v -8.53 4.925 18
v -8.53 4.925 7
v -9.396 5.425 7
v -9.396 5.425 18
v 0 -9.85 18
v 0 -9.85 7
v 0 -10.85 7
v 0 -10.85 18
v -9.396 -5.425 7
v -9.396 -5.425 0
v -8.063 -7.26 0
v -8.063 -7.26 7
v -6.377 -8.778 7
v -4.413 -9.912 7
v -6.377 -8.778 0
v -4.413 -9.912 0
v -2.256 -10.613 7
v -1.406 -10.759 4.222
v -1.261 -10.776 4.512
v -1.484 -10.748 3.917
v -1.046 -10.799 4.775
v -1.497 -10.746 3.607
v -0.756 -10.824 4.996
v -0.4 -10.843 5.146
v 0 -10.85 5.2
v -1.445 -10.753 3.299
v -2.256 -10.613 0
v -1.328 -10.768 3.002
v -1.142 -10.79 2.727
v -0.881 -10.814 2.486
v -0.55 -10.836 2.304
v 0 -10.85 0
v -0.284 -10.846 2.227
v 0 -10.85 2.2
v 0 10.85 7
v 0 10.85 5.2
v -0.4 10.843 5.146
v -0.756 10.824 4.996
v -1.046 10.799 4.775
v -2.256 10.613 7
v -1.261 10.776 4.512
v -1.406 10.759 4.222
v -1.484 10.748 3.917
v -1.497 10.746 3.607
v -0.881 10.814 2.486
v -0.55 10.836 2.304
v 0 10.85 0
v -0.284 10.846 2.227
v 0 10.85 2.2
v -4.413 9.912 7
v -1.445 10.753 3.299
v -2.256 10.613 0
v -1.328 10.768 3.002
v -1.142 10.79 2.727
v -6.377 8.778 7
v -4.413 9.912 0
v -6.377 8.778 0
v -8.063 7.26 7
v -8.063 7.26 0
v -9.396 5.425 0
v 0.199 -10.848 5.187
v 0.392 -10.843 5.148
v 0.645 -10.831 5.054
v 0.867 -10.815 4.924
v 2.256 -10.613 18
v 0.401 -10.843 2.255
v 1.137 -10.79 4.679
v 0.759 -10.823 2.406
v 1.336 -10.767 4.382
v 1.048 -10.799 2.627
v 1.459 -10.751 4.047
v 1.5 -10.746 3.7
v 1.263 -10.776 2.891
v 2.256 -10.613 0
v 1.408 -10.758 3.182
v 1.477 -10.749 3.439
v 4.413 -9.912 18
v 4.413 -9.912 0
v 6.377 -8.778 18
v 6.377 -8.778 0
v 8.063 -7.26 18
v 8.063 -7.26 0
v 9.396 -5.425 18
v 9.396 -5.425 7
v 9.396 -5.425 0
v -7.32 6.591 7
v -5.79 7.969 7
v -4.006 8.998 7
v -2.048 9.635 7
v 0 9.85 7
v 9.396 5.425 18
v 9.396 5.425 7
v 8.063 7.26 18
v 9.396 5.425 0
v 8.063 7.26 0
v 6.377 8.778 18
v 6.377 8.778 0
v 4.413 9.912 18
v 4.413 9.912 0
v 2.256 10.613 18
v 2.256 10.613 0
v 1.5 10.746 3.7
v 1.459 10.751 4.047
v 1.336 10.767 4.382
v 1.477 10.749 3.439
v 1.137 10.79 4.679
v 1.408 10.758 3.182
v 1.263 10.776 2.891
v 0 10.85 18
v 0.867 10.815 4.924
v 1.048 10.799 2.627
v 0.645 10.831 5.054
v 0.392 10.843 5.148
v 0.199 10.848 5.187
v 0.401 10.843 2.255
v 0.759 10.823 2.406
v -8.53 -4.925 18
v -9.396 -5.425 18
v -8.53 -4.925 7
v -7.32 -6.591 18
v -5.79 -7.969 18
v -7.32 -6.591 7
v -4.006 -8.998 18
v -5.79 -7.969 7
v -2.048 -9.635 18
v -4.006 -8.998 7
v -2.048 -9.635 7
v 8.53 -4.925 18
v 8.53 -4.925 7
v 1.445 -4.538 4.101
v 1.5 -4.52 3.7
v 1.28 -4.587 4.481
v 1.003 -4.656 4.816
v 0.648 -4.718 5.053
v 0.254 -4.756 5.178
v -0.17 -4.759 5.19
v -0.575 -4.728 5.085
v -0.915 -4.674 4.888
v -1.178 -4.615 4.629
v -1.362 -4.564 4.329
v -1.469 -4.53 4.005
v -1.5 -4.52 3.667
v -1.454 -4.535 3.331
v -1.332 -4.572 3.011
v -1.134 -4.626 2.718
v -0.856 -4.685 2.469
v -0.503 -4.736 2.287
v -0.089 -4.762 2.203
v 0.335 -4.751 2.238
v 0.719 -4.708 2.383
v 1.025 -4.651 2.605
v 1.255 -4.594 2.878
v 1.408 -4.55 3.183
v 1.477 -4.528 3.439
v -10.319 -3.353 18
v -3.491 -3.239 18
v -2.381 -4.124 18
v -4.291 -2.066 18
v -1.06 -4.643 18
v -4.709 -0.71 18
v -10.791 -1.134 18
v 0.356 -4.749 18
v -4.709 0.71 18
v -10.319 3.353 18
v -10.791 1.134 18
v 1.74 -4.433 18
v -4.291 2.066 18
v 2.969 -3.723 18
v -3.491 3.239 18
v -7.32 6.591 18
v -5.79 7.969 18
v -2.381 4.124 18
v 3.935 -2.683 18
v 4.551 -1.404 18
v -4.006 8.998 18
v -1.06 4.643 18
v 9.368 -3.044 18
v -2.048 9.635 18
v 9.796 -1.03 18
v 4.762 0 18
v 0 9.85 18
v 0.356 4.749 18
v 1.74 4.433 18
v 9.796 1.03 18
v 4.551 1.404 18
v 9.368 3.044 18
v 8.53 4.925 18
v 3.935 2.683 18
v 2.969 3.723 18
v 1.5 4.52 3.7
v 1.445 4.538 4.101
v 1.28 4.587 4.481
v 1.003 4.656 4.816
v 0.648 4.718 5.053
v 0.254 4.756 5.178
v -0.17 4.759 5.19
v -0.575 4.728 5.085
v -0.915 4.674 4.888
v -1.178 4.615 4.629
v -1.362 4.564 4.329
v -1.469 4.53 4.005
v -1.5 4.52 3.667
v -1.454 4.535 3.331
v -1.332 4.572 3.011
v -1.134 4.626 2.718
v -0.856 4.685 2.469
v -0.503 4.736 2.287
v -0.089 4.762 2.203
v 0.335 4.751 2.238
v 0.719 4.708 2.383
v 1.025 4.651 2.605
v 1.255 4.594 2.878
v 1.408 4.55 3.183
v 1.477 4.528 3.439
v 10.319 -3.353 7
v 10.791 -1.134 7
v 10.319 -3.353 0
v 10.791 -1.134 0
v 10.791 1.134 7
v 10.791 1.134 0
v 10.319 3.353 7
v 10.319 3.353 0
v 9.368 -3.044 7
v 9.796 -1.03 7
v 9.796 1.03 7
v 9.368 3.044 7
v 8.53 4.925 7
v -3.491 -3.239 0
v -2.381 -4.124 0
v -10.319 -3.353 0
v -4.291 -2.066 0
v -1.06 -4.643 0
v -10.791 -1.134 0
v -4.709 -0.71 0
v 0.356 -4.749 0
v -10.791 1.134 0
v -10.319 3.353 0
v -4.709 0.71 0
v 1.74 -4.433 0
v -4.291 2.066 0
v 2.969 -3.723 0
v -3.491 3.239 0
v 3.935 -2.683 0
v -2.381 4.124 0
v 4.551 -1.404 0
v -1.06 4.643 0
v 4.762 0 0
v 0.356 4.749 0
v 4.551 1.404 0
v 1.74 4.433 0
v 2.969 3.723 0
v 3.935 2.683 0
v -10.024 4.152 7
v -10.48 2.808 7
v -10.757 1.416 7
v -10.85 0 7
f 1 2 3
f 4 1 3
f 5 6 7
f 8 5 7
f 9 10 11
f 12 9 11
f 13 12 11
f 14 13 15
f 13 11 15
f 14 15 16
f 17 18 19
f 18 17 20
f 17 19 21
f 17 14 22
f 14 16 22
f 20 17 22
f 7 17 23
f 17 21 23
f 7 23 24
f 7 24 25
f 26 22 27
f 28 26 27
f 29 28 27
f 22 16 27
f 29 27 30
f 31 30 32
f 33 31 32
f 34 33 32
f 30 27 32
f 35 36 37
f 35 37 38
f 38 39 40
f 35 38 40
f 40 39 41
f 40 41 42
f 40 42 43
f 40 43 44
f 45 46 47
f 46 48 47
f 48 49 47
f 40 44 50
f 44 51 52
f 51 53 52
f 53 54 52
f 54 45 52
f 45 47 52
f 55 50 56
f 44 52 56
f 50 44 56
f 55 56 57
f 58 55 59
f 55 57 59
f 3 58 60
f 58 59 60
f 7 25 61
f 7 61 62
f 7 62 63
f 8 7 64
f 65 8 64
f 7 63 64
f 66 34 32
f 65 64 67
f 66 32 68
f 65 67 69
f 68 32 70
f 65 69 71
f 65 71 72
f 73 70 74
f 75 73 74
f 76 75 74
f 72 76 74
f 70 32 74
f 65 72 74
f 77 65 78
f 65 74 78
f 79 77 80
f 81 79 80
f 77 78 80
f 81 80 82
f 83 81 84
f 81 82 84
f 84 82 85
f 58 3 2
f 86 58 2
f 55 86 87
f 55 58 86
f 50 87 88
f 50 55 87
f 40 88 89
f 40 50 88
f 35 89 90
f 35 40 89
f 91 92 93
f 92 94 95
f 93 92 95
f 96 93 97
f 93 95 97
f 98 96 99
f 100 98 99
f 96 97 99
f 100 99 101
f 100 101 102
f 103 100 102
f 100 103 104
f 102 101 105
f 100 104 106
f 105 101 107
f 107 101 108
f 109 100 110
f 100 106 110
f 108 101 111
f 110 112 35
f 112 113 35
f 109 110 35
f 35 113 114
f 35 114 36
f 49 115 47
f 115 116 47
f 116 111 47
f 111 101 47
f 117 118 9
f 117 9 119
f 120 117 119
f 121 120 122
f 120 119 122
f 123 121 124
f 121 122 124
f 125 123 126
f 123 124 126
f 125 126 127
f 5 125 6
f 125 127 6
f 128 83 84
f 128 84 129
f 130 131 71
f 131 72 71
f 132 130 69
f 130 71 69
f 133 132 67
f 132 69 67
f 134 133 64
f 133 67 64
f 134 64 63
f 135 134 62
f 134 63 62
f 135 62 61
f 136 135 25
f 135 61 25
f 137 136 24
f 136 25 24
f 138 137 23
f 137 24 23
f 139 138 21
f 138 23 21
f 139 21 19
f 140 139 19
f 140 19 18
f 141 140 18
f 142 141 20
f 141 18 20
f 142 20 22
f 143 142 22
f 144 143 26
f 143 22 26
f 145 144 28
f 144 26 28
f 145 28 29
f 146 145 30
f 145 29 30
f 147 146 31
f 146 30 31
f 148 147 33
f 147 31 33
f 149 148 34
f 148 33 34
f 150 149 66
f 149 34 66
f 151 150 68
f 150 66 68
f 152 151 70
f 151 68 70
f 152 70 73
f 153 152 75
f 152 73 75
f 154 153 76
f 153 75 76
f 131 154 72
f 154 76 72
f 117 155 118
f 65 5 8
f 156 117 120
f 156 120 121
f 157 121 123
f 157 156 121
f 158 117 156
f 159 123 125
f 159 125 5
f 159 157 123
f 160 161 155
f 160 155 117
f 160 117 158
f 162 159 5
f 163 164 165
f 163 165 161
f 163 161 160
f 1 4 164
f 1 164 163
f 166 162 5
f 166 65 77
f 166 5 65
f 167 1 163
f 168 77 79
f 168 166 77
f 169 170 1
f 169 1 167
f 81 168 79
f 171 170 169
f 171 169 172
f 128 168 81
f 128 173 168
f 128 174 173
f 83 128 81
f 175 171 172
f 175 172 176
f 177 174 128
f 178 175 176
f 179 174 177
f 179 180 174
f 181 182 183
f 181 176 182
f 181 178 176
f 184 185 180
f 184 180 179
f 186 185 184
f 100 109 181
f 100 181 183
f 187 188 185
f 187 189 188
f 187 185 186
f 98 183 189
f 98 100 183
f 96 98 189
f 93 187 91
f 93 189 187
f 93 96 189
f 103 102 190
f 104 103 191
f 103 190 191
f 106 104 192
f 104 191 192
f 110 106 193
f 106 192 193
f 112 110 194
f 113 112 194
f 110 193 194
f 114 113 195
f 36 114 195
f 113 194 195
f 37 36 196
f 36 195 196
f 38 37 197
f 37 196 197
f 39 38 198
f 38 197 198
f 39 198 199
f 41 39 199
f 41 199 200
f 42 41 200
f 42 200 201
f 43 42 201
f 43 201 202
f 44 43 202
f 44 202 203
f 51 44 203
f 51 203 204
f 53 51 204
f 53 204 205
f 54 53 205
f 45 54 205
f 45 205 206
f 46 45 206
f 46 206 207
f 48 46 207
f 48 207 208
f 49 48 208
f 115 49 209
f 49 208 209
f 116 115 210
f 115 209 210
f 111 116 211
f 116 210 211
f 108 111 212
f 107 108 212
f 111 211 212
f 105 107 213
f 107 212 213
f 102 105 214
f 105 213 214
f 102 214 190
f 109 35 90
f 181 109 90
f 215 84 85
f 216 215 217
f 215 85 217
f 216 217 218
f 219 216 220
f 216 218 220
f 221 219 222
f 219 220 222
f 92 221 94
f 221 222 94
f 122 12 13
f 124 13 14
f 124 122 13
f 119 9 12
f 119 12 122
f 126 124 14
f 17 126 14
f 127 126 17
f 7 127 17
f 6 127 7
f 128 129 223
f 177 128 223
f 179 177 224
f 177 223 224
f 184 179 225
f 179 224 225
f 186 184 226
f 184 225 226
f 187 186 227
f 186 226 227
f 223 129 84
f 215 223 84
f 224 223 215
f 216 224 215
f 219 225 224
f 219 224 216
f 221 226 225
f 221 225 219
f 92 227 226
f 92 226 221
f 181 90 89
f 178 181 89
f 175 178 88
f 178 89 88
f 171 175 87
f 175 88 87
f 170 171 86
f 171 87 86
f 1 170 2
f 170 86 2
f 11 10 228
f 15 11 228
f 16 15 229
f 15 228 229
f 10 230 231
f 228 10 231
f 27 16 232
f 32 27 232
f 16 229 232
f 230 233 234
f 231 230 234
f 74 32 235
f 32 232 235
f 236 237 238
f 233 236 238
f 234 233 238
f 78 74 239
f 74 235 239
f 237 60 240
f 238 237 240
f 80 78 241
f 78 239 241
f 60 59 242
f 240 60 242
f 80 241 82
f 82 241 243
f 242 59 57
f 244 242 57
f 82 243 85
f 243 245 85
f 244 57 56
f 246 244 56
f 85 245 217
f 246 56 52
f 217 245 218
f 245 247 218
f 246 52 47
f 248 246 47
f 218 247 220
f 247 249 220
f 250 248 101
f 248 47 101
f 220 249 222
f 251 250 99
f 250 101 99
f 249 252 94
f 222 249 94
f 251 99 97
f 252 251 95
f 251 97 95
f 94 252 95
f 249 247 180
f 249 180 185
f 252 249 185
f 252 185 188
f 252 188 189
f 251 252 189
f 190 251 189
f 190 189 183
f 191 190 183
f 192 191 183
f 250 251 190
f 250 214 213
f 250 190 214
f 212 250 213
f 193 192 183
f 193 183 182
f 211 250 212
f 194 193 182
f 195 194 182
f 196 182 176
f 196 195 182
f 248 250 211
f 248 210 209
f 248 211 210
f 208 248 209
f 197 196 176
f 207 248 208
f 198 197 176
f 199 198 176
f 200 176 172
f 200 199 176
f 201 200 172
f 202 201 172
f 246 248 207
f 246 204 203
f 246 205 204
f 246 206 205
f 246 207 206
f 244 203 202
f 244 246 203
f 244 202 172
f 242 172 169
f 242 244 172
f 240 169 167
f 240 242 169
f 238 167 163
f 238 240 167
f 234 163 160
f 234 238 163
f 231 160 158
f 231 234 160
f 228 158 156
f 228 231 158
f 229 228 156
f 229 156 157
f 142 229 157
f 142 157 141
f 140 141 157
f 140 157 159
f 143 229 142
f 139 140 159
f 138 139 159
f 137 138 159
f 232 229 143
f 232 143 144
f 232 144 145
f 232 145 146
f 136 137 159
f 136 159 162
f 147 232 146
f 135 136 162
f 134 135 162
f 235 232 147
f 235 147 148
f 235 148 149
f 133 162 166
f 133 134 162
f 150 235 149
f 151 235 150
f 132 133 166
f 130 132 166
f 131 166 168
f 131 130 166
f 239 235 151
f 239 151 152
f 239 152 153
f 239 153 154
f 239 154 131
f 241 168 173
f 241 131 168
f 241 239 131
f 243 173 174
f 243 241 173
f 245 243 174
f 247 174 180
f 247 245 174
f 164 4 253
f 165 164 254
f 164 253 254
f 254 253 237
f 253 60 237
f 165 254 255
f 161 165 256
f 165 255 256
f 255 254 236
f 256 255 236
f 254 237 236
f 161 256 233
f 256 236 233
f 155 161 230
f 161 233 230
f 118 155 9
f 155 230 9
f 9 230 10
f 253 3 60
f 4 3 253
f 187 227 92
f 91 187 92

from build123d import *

# Parameters (mm, degrees)
F0_R     = 4.7625
F1_DEPTH = 18
F2_R     = 10.85
F2_R_2   = 4.7625
F3_DEPTH = 7
F4_R     = 1.5
F5_DEPTH = 12.5


with BuildPart() as f1:
    # F0 (on Top) → F1 (new body)
    with BuildSketch(Plane.XY):
        with BuildLine():
            Line((0, 10.85), (0, 9.85))
            ThreePointArc((0, 9.85), (-4.925, 8.53035), (-8.53035, 4.925))
            Line((-8.53035, 4.925), (-9.396376, 5.425))
            ThreePointArc((-9.396376, 5.425), (-10.85, 0), (-9.396376, -5.425))
            Line((-9.396376, -5.425), (-8.53035, -4.925))
            ThreePointArc((-8.53035, -4.925), (-4.925, -8.53035), (0, -9.85))
            Line((0, -9.85), (0, -10.85))
            ThreePointArc((0, -10.85), (5.425, -9.396376), (9.396376, -5.425))
            Line((9.396376, -5.425), (8.53035, -4.925))
            ThreePointArc((8.53035, -4.925), (9.85, 0), (8.53035, 4.925))
            Line((8.53035, 4.925), (9.396376, 5.425))
            ThreePointArc((9.396376, 5.425), (5.425, 9.396376), (0, 10.85))
        make_face()
        Circle(F0_R, mode=Mode.SUBTRACT)
    extrude(amount=F1_DEPTH)

    # F2 (on Top) → F3 (join)
    with BuildSketch(Plane.XY):
        Circle(F2_R)
        Circle(F2_R_2, mode=Mode.SUBTRACT)
    extrude(amount=F3_DEPTH)

    # F4 (on Front) → F5 (cut, symmetric)
    with BuildSketch(Plane.XZ):
        with Locations((0, 3.7)):
            Circle(F4_R)
    extrude(amount=F5_DEPTH, both=True, mode=Mode.SUBTRACT)


solid = f1.part
